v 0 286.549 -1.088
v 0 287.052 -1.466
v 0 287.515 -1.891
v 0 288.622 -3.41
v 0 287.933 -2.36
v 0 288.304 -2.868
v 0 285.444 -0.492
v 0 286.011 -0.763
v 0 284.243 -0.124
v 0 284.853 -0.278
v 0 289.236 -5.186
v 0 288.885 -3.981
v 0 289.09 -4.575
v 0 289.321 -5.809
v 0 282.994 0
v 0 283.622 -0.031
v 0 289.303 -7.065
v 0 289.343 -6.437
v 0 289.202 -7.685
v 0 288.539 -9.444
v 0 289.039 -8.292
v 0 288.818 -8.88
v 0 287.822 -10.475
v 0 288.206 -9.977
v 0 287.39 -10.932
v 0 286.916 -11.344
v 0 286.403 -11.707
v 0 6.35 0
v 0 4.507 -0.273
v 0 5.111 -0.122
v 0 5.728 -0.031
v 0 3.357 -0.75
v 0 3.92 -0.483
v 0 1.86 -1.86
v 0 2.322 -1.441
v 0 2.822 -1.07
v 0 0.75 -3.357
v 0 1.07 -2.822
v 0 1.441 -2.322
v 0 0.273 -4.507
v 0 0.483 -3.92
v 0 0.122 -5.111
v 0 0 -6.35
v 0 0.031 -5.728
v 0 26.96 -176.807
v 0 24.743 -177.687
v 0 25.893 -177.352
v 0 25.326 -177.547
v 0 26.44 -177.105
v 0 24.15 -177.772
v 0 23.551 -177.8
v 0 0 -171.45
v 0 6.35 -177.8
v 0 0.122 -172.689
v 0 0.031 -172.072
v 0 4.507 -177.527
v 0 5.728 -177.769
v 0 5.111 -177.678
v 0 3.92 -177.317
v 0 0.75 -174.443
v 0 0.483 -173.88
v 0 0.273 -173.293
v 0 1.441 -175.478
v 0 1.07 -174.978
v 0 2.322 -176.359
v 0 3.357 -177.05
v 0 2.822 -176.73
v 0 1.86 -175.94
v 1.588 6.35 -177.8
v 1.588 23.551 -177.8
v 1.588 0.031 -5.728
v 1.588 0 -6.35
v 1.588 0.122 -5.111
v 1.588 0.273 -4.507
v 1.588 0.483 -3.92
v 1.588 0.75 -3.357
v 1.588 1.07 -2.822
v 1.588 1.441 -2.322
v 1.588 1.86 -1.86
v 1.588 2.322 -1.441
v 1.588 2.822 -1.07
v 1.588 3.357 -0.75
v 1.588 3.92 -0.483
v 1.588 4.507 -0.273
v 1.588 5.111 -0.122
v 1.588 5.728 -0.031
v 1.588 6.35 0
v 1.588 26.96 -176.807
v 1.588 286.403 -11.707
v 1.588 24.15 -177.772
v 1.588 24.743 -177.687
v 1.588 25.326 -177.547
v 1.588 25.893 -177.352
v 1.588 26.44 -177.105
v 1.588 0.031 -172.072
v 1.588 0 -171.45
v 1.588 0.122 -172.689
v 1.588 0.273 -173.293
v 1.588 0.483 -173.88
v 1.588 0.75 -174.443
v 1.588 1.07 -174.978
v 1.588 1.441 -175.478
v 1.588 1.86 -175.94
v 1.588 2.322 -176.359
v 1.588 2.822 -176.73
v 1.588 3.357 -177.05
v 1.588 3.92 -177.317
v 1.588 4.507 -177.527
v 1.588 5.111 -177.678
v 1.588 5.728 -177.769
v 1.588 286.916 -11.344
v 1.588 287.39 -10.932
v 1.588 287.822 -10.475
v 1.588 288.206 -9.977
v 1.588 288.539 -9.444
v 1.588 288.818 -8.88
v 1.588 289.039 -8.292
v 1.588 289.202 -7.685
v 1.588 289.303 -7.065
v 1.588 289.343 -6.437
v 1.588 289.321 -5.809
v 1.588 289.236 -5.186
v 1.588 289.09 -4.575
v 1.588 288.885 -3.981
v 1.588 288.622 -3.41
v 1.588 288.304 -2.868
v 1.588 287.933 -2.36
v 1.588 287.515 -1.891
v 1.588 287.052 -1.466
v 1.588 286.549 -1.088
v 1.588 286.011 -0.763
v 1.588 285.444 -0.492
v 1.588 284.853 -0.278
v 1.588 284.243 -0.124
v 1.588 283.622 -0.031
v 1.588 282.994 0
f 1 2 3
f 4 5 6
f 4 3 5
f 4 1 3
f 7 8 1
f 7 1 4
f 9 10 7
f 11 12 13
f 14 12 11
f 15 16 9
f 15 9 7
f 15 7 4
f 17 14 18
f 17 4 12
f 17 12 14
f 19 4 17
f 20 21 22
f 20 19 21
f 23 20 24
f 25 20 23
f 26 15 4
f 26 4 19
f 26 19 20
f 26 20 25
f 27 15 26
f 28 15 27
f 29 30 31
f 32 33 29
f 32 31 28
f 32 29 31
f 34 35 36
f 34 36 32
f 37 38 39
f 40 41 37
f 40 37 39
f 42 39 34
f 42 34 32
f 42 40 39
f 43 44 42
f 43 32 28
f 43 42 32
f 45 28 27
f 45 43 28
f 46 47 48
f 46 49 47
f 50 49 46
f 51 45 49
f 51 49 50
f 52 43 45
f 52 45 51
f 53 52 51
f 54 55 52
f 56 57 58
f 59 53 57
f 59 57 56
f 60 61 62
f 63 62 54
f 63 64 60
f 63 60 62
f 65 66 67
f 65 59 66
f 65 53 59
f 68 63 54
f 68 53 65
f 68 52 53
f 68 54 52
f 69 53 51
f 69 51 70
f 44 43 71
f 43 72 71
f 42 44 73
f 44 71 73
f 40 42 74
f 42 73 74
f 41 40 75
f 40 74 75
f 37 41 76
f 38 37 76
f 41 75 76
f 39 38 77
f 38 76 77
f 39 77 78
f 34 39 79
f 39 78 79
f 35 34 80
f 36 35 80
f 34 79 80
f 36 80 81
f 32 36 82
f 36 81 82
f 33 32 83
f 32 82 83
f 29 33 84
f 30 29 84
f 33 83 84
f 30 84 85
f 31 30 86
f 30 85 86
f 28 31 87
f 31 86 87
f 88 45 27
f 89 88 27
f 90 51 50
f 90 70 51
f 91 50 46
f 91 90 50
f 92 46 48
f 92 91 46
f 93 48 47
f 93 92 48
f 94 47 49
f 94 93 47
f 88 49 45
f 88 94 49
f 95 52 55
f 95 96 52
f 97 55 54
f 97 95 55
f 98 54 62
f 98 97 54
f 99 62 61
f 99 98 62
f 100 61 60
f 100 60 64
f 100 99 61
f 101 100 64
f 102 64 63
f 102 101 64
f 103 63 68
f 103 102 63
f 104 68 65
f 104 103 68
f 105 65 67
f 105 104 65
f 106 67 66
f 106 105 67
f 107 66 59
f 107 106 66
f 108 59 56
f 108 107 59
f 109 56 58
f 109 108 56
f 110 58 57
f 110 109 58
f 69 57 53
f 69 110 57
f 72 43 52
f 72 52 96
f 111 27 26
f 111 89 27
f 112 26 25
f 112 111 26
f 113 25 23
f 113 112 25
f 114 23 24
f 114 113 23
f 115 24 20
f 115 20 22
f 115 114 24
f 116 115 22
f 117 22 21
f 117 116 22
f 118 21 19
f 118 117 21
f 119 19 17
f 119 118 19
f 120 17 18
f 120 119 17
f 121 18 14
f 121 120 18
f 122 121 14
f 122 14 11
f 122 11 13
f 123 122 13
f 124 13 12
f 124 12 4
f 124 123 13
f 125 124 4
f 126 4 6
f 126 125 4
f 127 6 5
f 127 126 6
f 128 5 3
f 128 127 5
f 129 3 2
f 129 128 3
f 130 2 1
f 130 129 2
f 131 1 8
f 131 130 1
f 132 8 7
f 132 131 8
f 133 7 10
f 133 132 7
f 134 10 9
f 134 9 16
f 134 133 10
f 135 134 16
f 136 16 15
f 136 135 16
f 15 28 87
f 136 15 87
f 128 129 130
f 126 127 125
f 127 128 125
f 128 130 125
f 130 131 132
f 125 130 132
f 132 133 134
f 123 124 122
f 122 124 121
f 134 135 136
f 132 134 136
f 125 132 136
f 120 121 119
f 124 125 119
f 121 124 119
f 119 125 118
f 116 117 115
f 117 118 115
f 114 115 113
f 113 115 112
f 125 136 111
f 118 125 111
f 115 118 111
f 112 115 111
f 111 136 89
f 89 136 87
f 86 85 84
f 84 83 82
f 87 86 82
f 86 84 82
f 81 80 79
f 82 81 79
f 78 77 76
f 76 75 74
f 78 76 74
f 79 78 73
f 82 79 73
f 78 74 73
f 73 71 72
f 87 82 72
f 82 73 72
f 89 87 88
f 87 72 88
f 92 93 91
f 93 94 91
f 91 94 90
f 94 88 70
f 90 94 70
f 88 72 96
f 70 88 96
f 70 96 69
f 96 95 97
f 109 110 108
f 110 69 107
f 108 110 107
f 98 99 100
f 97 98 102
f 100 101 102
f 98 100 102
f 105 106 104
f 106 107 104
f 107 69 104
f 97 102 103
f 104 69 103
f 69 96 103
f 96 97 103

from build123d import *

# Parameters (mm, degrees)
SKETCH1_W           = 1.5875
SKETCH1_H           = 177.8
BOSS_EXTRUDE1_DEPTH = 304.8
CUT_EXTRUDE1_DEPTH  = 1.5875
FILLET1_R           = 6.35


with BuildPart() as part:
    # Sketch1 → Boss-Extrude1 (new body)
    with BuildSketch(Plane(origin=(0, 0, 0), x_dir=(1, 0, 0), z_dir=(0, 1, 0))):
        with Locations((0.79375, 88.9)):
            Rectangle(SKETCH1_W, SKETCH1_H)
    extrude(amount=BOSS_EXTRUDE1_DEPTH)

    # Sketch2 → Cut-Extrude1 (cut)
    with BuildSketch(Plane.ZY):
        Polygon((-177.8, 25.4), (0, 304.8), (-177.8, 304.8), align=None)
    extrude(amount=-CUT_EXTRUDE1_DEPTH, mode=Mode.SUBTRACT)

    # Fillet1
    fillet1_edges = [part.edges().sort_by_distance(p)[0] for p in [
        (0.79375, 25.4, -177.8),
        (0.79375, 304.8, 0),
        (0.79375, 0, -177.8),
        (0.79375, 0, 0),
    ]]
    fillet(fillet1_edges, radius=FILLET1_R)


solid = part.part
